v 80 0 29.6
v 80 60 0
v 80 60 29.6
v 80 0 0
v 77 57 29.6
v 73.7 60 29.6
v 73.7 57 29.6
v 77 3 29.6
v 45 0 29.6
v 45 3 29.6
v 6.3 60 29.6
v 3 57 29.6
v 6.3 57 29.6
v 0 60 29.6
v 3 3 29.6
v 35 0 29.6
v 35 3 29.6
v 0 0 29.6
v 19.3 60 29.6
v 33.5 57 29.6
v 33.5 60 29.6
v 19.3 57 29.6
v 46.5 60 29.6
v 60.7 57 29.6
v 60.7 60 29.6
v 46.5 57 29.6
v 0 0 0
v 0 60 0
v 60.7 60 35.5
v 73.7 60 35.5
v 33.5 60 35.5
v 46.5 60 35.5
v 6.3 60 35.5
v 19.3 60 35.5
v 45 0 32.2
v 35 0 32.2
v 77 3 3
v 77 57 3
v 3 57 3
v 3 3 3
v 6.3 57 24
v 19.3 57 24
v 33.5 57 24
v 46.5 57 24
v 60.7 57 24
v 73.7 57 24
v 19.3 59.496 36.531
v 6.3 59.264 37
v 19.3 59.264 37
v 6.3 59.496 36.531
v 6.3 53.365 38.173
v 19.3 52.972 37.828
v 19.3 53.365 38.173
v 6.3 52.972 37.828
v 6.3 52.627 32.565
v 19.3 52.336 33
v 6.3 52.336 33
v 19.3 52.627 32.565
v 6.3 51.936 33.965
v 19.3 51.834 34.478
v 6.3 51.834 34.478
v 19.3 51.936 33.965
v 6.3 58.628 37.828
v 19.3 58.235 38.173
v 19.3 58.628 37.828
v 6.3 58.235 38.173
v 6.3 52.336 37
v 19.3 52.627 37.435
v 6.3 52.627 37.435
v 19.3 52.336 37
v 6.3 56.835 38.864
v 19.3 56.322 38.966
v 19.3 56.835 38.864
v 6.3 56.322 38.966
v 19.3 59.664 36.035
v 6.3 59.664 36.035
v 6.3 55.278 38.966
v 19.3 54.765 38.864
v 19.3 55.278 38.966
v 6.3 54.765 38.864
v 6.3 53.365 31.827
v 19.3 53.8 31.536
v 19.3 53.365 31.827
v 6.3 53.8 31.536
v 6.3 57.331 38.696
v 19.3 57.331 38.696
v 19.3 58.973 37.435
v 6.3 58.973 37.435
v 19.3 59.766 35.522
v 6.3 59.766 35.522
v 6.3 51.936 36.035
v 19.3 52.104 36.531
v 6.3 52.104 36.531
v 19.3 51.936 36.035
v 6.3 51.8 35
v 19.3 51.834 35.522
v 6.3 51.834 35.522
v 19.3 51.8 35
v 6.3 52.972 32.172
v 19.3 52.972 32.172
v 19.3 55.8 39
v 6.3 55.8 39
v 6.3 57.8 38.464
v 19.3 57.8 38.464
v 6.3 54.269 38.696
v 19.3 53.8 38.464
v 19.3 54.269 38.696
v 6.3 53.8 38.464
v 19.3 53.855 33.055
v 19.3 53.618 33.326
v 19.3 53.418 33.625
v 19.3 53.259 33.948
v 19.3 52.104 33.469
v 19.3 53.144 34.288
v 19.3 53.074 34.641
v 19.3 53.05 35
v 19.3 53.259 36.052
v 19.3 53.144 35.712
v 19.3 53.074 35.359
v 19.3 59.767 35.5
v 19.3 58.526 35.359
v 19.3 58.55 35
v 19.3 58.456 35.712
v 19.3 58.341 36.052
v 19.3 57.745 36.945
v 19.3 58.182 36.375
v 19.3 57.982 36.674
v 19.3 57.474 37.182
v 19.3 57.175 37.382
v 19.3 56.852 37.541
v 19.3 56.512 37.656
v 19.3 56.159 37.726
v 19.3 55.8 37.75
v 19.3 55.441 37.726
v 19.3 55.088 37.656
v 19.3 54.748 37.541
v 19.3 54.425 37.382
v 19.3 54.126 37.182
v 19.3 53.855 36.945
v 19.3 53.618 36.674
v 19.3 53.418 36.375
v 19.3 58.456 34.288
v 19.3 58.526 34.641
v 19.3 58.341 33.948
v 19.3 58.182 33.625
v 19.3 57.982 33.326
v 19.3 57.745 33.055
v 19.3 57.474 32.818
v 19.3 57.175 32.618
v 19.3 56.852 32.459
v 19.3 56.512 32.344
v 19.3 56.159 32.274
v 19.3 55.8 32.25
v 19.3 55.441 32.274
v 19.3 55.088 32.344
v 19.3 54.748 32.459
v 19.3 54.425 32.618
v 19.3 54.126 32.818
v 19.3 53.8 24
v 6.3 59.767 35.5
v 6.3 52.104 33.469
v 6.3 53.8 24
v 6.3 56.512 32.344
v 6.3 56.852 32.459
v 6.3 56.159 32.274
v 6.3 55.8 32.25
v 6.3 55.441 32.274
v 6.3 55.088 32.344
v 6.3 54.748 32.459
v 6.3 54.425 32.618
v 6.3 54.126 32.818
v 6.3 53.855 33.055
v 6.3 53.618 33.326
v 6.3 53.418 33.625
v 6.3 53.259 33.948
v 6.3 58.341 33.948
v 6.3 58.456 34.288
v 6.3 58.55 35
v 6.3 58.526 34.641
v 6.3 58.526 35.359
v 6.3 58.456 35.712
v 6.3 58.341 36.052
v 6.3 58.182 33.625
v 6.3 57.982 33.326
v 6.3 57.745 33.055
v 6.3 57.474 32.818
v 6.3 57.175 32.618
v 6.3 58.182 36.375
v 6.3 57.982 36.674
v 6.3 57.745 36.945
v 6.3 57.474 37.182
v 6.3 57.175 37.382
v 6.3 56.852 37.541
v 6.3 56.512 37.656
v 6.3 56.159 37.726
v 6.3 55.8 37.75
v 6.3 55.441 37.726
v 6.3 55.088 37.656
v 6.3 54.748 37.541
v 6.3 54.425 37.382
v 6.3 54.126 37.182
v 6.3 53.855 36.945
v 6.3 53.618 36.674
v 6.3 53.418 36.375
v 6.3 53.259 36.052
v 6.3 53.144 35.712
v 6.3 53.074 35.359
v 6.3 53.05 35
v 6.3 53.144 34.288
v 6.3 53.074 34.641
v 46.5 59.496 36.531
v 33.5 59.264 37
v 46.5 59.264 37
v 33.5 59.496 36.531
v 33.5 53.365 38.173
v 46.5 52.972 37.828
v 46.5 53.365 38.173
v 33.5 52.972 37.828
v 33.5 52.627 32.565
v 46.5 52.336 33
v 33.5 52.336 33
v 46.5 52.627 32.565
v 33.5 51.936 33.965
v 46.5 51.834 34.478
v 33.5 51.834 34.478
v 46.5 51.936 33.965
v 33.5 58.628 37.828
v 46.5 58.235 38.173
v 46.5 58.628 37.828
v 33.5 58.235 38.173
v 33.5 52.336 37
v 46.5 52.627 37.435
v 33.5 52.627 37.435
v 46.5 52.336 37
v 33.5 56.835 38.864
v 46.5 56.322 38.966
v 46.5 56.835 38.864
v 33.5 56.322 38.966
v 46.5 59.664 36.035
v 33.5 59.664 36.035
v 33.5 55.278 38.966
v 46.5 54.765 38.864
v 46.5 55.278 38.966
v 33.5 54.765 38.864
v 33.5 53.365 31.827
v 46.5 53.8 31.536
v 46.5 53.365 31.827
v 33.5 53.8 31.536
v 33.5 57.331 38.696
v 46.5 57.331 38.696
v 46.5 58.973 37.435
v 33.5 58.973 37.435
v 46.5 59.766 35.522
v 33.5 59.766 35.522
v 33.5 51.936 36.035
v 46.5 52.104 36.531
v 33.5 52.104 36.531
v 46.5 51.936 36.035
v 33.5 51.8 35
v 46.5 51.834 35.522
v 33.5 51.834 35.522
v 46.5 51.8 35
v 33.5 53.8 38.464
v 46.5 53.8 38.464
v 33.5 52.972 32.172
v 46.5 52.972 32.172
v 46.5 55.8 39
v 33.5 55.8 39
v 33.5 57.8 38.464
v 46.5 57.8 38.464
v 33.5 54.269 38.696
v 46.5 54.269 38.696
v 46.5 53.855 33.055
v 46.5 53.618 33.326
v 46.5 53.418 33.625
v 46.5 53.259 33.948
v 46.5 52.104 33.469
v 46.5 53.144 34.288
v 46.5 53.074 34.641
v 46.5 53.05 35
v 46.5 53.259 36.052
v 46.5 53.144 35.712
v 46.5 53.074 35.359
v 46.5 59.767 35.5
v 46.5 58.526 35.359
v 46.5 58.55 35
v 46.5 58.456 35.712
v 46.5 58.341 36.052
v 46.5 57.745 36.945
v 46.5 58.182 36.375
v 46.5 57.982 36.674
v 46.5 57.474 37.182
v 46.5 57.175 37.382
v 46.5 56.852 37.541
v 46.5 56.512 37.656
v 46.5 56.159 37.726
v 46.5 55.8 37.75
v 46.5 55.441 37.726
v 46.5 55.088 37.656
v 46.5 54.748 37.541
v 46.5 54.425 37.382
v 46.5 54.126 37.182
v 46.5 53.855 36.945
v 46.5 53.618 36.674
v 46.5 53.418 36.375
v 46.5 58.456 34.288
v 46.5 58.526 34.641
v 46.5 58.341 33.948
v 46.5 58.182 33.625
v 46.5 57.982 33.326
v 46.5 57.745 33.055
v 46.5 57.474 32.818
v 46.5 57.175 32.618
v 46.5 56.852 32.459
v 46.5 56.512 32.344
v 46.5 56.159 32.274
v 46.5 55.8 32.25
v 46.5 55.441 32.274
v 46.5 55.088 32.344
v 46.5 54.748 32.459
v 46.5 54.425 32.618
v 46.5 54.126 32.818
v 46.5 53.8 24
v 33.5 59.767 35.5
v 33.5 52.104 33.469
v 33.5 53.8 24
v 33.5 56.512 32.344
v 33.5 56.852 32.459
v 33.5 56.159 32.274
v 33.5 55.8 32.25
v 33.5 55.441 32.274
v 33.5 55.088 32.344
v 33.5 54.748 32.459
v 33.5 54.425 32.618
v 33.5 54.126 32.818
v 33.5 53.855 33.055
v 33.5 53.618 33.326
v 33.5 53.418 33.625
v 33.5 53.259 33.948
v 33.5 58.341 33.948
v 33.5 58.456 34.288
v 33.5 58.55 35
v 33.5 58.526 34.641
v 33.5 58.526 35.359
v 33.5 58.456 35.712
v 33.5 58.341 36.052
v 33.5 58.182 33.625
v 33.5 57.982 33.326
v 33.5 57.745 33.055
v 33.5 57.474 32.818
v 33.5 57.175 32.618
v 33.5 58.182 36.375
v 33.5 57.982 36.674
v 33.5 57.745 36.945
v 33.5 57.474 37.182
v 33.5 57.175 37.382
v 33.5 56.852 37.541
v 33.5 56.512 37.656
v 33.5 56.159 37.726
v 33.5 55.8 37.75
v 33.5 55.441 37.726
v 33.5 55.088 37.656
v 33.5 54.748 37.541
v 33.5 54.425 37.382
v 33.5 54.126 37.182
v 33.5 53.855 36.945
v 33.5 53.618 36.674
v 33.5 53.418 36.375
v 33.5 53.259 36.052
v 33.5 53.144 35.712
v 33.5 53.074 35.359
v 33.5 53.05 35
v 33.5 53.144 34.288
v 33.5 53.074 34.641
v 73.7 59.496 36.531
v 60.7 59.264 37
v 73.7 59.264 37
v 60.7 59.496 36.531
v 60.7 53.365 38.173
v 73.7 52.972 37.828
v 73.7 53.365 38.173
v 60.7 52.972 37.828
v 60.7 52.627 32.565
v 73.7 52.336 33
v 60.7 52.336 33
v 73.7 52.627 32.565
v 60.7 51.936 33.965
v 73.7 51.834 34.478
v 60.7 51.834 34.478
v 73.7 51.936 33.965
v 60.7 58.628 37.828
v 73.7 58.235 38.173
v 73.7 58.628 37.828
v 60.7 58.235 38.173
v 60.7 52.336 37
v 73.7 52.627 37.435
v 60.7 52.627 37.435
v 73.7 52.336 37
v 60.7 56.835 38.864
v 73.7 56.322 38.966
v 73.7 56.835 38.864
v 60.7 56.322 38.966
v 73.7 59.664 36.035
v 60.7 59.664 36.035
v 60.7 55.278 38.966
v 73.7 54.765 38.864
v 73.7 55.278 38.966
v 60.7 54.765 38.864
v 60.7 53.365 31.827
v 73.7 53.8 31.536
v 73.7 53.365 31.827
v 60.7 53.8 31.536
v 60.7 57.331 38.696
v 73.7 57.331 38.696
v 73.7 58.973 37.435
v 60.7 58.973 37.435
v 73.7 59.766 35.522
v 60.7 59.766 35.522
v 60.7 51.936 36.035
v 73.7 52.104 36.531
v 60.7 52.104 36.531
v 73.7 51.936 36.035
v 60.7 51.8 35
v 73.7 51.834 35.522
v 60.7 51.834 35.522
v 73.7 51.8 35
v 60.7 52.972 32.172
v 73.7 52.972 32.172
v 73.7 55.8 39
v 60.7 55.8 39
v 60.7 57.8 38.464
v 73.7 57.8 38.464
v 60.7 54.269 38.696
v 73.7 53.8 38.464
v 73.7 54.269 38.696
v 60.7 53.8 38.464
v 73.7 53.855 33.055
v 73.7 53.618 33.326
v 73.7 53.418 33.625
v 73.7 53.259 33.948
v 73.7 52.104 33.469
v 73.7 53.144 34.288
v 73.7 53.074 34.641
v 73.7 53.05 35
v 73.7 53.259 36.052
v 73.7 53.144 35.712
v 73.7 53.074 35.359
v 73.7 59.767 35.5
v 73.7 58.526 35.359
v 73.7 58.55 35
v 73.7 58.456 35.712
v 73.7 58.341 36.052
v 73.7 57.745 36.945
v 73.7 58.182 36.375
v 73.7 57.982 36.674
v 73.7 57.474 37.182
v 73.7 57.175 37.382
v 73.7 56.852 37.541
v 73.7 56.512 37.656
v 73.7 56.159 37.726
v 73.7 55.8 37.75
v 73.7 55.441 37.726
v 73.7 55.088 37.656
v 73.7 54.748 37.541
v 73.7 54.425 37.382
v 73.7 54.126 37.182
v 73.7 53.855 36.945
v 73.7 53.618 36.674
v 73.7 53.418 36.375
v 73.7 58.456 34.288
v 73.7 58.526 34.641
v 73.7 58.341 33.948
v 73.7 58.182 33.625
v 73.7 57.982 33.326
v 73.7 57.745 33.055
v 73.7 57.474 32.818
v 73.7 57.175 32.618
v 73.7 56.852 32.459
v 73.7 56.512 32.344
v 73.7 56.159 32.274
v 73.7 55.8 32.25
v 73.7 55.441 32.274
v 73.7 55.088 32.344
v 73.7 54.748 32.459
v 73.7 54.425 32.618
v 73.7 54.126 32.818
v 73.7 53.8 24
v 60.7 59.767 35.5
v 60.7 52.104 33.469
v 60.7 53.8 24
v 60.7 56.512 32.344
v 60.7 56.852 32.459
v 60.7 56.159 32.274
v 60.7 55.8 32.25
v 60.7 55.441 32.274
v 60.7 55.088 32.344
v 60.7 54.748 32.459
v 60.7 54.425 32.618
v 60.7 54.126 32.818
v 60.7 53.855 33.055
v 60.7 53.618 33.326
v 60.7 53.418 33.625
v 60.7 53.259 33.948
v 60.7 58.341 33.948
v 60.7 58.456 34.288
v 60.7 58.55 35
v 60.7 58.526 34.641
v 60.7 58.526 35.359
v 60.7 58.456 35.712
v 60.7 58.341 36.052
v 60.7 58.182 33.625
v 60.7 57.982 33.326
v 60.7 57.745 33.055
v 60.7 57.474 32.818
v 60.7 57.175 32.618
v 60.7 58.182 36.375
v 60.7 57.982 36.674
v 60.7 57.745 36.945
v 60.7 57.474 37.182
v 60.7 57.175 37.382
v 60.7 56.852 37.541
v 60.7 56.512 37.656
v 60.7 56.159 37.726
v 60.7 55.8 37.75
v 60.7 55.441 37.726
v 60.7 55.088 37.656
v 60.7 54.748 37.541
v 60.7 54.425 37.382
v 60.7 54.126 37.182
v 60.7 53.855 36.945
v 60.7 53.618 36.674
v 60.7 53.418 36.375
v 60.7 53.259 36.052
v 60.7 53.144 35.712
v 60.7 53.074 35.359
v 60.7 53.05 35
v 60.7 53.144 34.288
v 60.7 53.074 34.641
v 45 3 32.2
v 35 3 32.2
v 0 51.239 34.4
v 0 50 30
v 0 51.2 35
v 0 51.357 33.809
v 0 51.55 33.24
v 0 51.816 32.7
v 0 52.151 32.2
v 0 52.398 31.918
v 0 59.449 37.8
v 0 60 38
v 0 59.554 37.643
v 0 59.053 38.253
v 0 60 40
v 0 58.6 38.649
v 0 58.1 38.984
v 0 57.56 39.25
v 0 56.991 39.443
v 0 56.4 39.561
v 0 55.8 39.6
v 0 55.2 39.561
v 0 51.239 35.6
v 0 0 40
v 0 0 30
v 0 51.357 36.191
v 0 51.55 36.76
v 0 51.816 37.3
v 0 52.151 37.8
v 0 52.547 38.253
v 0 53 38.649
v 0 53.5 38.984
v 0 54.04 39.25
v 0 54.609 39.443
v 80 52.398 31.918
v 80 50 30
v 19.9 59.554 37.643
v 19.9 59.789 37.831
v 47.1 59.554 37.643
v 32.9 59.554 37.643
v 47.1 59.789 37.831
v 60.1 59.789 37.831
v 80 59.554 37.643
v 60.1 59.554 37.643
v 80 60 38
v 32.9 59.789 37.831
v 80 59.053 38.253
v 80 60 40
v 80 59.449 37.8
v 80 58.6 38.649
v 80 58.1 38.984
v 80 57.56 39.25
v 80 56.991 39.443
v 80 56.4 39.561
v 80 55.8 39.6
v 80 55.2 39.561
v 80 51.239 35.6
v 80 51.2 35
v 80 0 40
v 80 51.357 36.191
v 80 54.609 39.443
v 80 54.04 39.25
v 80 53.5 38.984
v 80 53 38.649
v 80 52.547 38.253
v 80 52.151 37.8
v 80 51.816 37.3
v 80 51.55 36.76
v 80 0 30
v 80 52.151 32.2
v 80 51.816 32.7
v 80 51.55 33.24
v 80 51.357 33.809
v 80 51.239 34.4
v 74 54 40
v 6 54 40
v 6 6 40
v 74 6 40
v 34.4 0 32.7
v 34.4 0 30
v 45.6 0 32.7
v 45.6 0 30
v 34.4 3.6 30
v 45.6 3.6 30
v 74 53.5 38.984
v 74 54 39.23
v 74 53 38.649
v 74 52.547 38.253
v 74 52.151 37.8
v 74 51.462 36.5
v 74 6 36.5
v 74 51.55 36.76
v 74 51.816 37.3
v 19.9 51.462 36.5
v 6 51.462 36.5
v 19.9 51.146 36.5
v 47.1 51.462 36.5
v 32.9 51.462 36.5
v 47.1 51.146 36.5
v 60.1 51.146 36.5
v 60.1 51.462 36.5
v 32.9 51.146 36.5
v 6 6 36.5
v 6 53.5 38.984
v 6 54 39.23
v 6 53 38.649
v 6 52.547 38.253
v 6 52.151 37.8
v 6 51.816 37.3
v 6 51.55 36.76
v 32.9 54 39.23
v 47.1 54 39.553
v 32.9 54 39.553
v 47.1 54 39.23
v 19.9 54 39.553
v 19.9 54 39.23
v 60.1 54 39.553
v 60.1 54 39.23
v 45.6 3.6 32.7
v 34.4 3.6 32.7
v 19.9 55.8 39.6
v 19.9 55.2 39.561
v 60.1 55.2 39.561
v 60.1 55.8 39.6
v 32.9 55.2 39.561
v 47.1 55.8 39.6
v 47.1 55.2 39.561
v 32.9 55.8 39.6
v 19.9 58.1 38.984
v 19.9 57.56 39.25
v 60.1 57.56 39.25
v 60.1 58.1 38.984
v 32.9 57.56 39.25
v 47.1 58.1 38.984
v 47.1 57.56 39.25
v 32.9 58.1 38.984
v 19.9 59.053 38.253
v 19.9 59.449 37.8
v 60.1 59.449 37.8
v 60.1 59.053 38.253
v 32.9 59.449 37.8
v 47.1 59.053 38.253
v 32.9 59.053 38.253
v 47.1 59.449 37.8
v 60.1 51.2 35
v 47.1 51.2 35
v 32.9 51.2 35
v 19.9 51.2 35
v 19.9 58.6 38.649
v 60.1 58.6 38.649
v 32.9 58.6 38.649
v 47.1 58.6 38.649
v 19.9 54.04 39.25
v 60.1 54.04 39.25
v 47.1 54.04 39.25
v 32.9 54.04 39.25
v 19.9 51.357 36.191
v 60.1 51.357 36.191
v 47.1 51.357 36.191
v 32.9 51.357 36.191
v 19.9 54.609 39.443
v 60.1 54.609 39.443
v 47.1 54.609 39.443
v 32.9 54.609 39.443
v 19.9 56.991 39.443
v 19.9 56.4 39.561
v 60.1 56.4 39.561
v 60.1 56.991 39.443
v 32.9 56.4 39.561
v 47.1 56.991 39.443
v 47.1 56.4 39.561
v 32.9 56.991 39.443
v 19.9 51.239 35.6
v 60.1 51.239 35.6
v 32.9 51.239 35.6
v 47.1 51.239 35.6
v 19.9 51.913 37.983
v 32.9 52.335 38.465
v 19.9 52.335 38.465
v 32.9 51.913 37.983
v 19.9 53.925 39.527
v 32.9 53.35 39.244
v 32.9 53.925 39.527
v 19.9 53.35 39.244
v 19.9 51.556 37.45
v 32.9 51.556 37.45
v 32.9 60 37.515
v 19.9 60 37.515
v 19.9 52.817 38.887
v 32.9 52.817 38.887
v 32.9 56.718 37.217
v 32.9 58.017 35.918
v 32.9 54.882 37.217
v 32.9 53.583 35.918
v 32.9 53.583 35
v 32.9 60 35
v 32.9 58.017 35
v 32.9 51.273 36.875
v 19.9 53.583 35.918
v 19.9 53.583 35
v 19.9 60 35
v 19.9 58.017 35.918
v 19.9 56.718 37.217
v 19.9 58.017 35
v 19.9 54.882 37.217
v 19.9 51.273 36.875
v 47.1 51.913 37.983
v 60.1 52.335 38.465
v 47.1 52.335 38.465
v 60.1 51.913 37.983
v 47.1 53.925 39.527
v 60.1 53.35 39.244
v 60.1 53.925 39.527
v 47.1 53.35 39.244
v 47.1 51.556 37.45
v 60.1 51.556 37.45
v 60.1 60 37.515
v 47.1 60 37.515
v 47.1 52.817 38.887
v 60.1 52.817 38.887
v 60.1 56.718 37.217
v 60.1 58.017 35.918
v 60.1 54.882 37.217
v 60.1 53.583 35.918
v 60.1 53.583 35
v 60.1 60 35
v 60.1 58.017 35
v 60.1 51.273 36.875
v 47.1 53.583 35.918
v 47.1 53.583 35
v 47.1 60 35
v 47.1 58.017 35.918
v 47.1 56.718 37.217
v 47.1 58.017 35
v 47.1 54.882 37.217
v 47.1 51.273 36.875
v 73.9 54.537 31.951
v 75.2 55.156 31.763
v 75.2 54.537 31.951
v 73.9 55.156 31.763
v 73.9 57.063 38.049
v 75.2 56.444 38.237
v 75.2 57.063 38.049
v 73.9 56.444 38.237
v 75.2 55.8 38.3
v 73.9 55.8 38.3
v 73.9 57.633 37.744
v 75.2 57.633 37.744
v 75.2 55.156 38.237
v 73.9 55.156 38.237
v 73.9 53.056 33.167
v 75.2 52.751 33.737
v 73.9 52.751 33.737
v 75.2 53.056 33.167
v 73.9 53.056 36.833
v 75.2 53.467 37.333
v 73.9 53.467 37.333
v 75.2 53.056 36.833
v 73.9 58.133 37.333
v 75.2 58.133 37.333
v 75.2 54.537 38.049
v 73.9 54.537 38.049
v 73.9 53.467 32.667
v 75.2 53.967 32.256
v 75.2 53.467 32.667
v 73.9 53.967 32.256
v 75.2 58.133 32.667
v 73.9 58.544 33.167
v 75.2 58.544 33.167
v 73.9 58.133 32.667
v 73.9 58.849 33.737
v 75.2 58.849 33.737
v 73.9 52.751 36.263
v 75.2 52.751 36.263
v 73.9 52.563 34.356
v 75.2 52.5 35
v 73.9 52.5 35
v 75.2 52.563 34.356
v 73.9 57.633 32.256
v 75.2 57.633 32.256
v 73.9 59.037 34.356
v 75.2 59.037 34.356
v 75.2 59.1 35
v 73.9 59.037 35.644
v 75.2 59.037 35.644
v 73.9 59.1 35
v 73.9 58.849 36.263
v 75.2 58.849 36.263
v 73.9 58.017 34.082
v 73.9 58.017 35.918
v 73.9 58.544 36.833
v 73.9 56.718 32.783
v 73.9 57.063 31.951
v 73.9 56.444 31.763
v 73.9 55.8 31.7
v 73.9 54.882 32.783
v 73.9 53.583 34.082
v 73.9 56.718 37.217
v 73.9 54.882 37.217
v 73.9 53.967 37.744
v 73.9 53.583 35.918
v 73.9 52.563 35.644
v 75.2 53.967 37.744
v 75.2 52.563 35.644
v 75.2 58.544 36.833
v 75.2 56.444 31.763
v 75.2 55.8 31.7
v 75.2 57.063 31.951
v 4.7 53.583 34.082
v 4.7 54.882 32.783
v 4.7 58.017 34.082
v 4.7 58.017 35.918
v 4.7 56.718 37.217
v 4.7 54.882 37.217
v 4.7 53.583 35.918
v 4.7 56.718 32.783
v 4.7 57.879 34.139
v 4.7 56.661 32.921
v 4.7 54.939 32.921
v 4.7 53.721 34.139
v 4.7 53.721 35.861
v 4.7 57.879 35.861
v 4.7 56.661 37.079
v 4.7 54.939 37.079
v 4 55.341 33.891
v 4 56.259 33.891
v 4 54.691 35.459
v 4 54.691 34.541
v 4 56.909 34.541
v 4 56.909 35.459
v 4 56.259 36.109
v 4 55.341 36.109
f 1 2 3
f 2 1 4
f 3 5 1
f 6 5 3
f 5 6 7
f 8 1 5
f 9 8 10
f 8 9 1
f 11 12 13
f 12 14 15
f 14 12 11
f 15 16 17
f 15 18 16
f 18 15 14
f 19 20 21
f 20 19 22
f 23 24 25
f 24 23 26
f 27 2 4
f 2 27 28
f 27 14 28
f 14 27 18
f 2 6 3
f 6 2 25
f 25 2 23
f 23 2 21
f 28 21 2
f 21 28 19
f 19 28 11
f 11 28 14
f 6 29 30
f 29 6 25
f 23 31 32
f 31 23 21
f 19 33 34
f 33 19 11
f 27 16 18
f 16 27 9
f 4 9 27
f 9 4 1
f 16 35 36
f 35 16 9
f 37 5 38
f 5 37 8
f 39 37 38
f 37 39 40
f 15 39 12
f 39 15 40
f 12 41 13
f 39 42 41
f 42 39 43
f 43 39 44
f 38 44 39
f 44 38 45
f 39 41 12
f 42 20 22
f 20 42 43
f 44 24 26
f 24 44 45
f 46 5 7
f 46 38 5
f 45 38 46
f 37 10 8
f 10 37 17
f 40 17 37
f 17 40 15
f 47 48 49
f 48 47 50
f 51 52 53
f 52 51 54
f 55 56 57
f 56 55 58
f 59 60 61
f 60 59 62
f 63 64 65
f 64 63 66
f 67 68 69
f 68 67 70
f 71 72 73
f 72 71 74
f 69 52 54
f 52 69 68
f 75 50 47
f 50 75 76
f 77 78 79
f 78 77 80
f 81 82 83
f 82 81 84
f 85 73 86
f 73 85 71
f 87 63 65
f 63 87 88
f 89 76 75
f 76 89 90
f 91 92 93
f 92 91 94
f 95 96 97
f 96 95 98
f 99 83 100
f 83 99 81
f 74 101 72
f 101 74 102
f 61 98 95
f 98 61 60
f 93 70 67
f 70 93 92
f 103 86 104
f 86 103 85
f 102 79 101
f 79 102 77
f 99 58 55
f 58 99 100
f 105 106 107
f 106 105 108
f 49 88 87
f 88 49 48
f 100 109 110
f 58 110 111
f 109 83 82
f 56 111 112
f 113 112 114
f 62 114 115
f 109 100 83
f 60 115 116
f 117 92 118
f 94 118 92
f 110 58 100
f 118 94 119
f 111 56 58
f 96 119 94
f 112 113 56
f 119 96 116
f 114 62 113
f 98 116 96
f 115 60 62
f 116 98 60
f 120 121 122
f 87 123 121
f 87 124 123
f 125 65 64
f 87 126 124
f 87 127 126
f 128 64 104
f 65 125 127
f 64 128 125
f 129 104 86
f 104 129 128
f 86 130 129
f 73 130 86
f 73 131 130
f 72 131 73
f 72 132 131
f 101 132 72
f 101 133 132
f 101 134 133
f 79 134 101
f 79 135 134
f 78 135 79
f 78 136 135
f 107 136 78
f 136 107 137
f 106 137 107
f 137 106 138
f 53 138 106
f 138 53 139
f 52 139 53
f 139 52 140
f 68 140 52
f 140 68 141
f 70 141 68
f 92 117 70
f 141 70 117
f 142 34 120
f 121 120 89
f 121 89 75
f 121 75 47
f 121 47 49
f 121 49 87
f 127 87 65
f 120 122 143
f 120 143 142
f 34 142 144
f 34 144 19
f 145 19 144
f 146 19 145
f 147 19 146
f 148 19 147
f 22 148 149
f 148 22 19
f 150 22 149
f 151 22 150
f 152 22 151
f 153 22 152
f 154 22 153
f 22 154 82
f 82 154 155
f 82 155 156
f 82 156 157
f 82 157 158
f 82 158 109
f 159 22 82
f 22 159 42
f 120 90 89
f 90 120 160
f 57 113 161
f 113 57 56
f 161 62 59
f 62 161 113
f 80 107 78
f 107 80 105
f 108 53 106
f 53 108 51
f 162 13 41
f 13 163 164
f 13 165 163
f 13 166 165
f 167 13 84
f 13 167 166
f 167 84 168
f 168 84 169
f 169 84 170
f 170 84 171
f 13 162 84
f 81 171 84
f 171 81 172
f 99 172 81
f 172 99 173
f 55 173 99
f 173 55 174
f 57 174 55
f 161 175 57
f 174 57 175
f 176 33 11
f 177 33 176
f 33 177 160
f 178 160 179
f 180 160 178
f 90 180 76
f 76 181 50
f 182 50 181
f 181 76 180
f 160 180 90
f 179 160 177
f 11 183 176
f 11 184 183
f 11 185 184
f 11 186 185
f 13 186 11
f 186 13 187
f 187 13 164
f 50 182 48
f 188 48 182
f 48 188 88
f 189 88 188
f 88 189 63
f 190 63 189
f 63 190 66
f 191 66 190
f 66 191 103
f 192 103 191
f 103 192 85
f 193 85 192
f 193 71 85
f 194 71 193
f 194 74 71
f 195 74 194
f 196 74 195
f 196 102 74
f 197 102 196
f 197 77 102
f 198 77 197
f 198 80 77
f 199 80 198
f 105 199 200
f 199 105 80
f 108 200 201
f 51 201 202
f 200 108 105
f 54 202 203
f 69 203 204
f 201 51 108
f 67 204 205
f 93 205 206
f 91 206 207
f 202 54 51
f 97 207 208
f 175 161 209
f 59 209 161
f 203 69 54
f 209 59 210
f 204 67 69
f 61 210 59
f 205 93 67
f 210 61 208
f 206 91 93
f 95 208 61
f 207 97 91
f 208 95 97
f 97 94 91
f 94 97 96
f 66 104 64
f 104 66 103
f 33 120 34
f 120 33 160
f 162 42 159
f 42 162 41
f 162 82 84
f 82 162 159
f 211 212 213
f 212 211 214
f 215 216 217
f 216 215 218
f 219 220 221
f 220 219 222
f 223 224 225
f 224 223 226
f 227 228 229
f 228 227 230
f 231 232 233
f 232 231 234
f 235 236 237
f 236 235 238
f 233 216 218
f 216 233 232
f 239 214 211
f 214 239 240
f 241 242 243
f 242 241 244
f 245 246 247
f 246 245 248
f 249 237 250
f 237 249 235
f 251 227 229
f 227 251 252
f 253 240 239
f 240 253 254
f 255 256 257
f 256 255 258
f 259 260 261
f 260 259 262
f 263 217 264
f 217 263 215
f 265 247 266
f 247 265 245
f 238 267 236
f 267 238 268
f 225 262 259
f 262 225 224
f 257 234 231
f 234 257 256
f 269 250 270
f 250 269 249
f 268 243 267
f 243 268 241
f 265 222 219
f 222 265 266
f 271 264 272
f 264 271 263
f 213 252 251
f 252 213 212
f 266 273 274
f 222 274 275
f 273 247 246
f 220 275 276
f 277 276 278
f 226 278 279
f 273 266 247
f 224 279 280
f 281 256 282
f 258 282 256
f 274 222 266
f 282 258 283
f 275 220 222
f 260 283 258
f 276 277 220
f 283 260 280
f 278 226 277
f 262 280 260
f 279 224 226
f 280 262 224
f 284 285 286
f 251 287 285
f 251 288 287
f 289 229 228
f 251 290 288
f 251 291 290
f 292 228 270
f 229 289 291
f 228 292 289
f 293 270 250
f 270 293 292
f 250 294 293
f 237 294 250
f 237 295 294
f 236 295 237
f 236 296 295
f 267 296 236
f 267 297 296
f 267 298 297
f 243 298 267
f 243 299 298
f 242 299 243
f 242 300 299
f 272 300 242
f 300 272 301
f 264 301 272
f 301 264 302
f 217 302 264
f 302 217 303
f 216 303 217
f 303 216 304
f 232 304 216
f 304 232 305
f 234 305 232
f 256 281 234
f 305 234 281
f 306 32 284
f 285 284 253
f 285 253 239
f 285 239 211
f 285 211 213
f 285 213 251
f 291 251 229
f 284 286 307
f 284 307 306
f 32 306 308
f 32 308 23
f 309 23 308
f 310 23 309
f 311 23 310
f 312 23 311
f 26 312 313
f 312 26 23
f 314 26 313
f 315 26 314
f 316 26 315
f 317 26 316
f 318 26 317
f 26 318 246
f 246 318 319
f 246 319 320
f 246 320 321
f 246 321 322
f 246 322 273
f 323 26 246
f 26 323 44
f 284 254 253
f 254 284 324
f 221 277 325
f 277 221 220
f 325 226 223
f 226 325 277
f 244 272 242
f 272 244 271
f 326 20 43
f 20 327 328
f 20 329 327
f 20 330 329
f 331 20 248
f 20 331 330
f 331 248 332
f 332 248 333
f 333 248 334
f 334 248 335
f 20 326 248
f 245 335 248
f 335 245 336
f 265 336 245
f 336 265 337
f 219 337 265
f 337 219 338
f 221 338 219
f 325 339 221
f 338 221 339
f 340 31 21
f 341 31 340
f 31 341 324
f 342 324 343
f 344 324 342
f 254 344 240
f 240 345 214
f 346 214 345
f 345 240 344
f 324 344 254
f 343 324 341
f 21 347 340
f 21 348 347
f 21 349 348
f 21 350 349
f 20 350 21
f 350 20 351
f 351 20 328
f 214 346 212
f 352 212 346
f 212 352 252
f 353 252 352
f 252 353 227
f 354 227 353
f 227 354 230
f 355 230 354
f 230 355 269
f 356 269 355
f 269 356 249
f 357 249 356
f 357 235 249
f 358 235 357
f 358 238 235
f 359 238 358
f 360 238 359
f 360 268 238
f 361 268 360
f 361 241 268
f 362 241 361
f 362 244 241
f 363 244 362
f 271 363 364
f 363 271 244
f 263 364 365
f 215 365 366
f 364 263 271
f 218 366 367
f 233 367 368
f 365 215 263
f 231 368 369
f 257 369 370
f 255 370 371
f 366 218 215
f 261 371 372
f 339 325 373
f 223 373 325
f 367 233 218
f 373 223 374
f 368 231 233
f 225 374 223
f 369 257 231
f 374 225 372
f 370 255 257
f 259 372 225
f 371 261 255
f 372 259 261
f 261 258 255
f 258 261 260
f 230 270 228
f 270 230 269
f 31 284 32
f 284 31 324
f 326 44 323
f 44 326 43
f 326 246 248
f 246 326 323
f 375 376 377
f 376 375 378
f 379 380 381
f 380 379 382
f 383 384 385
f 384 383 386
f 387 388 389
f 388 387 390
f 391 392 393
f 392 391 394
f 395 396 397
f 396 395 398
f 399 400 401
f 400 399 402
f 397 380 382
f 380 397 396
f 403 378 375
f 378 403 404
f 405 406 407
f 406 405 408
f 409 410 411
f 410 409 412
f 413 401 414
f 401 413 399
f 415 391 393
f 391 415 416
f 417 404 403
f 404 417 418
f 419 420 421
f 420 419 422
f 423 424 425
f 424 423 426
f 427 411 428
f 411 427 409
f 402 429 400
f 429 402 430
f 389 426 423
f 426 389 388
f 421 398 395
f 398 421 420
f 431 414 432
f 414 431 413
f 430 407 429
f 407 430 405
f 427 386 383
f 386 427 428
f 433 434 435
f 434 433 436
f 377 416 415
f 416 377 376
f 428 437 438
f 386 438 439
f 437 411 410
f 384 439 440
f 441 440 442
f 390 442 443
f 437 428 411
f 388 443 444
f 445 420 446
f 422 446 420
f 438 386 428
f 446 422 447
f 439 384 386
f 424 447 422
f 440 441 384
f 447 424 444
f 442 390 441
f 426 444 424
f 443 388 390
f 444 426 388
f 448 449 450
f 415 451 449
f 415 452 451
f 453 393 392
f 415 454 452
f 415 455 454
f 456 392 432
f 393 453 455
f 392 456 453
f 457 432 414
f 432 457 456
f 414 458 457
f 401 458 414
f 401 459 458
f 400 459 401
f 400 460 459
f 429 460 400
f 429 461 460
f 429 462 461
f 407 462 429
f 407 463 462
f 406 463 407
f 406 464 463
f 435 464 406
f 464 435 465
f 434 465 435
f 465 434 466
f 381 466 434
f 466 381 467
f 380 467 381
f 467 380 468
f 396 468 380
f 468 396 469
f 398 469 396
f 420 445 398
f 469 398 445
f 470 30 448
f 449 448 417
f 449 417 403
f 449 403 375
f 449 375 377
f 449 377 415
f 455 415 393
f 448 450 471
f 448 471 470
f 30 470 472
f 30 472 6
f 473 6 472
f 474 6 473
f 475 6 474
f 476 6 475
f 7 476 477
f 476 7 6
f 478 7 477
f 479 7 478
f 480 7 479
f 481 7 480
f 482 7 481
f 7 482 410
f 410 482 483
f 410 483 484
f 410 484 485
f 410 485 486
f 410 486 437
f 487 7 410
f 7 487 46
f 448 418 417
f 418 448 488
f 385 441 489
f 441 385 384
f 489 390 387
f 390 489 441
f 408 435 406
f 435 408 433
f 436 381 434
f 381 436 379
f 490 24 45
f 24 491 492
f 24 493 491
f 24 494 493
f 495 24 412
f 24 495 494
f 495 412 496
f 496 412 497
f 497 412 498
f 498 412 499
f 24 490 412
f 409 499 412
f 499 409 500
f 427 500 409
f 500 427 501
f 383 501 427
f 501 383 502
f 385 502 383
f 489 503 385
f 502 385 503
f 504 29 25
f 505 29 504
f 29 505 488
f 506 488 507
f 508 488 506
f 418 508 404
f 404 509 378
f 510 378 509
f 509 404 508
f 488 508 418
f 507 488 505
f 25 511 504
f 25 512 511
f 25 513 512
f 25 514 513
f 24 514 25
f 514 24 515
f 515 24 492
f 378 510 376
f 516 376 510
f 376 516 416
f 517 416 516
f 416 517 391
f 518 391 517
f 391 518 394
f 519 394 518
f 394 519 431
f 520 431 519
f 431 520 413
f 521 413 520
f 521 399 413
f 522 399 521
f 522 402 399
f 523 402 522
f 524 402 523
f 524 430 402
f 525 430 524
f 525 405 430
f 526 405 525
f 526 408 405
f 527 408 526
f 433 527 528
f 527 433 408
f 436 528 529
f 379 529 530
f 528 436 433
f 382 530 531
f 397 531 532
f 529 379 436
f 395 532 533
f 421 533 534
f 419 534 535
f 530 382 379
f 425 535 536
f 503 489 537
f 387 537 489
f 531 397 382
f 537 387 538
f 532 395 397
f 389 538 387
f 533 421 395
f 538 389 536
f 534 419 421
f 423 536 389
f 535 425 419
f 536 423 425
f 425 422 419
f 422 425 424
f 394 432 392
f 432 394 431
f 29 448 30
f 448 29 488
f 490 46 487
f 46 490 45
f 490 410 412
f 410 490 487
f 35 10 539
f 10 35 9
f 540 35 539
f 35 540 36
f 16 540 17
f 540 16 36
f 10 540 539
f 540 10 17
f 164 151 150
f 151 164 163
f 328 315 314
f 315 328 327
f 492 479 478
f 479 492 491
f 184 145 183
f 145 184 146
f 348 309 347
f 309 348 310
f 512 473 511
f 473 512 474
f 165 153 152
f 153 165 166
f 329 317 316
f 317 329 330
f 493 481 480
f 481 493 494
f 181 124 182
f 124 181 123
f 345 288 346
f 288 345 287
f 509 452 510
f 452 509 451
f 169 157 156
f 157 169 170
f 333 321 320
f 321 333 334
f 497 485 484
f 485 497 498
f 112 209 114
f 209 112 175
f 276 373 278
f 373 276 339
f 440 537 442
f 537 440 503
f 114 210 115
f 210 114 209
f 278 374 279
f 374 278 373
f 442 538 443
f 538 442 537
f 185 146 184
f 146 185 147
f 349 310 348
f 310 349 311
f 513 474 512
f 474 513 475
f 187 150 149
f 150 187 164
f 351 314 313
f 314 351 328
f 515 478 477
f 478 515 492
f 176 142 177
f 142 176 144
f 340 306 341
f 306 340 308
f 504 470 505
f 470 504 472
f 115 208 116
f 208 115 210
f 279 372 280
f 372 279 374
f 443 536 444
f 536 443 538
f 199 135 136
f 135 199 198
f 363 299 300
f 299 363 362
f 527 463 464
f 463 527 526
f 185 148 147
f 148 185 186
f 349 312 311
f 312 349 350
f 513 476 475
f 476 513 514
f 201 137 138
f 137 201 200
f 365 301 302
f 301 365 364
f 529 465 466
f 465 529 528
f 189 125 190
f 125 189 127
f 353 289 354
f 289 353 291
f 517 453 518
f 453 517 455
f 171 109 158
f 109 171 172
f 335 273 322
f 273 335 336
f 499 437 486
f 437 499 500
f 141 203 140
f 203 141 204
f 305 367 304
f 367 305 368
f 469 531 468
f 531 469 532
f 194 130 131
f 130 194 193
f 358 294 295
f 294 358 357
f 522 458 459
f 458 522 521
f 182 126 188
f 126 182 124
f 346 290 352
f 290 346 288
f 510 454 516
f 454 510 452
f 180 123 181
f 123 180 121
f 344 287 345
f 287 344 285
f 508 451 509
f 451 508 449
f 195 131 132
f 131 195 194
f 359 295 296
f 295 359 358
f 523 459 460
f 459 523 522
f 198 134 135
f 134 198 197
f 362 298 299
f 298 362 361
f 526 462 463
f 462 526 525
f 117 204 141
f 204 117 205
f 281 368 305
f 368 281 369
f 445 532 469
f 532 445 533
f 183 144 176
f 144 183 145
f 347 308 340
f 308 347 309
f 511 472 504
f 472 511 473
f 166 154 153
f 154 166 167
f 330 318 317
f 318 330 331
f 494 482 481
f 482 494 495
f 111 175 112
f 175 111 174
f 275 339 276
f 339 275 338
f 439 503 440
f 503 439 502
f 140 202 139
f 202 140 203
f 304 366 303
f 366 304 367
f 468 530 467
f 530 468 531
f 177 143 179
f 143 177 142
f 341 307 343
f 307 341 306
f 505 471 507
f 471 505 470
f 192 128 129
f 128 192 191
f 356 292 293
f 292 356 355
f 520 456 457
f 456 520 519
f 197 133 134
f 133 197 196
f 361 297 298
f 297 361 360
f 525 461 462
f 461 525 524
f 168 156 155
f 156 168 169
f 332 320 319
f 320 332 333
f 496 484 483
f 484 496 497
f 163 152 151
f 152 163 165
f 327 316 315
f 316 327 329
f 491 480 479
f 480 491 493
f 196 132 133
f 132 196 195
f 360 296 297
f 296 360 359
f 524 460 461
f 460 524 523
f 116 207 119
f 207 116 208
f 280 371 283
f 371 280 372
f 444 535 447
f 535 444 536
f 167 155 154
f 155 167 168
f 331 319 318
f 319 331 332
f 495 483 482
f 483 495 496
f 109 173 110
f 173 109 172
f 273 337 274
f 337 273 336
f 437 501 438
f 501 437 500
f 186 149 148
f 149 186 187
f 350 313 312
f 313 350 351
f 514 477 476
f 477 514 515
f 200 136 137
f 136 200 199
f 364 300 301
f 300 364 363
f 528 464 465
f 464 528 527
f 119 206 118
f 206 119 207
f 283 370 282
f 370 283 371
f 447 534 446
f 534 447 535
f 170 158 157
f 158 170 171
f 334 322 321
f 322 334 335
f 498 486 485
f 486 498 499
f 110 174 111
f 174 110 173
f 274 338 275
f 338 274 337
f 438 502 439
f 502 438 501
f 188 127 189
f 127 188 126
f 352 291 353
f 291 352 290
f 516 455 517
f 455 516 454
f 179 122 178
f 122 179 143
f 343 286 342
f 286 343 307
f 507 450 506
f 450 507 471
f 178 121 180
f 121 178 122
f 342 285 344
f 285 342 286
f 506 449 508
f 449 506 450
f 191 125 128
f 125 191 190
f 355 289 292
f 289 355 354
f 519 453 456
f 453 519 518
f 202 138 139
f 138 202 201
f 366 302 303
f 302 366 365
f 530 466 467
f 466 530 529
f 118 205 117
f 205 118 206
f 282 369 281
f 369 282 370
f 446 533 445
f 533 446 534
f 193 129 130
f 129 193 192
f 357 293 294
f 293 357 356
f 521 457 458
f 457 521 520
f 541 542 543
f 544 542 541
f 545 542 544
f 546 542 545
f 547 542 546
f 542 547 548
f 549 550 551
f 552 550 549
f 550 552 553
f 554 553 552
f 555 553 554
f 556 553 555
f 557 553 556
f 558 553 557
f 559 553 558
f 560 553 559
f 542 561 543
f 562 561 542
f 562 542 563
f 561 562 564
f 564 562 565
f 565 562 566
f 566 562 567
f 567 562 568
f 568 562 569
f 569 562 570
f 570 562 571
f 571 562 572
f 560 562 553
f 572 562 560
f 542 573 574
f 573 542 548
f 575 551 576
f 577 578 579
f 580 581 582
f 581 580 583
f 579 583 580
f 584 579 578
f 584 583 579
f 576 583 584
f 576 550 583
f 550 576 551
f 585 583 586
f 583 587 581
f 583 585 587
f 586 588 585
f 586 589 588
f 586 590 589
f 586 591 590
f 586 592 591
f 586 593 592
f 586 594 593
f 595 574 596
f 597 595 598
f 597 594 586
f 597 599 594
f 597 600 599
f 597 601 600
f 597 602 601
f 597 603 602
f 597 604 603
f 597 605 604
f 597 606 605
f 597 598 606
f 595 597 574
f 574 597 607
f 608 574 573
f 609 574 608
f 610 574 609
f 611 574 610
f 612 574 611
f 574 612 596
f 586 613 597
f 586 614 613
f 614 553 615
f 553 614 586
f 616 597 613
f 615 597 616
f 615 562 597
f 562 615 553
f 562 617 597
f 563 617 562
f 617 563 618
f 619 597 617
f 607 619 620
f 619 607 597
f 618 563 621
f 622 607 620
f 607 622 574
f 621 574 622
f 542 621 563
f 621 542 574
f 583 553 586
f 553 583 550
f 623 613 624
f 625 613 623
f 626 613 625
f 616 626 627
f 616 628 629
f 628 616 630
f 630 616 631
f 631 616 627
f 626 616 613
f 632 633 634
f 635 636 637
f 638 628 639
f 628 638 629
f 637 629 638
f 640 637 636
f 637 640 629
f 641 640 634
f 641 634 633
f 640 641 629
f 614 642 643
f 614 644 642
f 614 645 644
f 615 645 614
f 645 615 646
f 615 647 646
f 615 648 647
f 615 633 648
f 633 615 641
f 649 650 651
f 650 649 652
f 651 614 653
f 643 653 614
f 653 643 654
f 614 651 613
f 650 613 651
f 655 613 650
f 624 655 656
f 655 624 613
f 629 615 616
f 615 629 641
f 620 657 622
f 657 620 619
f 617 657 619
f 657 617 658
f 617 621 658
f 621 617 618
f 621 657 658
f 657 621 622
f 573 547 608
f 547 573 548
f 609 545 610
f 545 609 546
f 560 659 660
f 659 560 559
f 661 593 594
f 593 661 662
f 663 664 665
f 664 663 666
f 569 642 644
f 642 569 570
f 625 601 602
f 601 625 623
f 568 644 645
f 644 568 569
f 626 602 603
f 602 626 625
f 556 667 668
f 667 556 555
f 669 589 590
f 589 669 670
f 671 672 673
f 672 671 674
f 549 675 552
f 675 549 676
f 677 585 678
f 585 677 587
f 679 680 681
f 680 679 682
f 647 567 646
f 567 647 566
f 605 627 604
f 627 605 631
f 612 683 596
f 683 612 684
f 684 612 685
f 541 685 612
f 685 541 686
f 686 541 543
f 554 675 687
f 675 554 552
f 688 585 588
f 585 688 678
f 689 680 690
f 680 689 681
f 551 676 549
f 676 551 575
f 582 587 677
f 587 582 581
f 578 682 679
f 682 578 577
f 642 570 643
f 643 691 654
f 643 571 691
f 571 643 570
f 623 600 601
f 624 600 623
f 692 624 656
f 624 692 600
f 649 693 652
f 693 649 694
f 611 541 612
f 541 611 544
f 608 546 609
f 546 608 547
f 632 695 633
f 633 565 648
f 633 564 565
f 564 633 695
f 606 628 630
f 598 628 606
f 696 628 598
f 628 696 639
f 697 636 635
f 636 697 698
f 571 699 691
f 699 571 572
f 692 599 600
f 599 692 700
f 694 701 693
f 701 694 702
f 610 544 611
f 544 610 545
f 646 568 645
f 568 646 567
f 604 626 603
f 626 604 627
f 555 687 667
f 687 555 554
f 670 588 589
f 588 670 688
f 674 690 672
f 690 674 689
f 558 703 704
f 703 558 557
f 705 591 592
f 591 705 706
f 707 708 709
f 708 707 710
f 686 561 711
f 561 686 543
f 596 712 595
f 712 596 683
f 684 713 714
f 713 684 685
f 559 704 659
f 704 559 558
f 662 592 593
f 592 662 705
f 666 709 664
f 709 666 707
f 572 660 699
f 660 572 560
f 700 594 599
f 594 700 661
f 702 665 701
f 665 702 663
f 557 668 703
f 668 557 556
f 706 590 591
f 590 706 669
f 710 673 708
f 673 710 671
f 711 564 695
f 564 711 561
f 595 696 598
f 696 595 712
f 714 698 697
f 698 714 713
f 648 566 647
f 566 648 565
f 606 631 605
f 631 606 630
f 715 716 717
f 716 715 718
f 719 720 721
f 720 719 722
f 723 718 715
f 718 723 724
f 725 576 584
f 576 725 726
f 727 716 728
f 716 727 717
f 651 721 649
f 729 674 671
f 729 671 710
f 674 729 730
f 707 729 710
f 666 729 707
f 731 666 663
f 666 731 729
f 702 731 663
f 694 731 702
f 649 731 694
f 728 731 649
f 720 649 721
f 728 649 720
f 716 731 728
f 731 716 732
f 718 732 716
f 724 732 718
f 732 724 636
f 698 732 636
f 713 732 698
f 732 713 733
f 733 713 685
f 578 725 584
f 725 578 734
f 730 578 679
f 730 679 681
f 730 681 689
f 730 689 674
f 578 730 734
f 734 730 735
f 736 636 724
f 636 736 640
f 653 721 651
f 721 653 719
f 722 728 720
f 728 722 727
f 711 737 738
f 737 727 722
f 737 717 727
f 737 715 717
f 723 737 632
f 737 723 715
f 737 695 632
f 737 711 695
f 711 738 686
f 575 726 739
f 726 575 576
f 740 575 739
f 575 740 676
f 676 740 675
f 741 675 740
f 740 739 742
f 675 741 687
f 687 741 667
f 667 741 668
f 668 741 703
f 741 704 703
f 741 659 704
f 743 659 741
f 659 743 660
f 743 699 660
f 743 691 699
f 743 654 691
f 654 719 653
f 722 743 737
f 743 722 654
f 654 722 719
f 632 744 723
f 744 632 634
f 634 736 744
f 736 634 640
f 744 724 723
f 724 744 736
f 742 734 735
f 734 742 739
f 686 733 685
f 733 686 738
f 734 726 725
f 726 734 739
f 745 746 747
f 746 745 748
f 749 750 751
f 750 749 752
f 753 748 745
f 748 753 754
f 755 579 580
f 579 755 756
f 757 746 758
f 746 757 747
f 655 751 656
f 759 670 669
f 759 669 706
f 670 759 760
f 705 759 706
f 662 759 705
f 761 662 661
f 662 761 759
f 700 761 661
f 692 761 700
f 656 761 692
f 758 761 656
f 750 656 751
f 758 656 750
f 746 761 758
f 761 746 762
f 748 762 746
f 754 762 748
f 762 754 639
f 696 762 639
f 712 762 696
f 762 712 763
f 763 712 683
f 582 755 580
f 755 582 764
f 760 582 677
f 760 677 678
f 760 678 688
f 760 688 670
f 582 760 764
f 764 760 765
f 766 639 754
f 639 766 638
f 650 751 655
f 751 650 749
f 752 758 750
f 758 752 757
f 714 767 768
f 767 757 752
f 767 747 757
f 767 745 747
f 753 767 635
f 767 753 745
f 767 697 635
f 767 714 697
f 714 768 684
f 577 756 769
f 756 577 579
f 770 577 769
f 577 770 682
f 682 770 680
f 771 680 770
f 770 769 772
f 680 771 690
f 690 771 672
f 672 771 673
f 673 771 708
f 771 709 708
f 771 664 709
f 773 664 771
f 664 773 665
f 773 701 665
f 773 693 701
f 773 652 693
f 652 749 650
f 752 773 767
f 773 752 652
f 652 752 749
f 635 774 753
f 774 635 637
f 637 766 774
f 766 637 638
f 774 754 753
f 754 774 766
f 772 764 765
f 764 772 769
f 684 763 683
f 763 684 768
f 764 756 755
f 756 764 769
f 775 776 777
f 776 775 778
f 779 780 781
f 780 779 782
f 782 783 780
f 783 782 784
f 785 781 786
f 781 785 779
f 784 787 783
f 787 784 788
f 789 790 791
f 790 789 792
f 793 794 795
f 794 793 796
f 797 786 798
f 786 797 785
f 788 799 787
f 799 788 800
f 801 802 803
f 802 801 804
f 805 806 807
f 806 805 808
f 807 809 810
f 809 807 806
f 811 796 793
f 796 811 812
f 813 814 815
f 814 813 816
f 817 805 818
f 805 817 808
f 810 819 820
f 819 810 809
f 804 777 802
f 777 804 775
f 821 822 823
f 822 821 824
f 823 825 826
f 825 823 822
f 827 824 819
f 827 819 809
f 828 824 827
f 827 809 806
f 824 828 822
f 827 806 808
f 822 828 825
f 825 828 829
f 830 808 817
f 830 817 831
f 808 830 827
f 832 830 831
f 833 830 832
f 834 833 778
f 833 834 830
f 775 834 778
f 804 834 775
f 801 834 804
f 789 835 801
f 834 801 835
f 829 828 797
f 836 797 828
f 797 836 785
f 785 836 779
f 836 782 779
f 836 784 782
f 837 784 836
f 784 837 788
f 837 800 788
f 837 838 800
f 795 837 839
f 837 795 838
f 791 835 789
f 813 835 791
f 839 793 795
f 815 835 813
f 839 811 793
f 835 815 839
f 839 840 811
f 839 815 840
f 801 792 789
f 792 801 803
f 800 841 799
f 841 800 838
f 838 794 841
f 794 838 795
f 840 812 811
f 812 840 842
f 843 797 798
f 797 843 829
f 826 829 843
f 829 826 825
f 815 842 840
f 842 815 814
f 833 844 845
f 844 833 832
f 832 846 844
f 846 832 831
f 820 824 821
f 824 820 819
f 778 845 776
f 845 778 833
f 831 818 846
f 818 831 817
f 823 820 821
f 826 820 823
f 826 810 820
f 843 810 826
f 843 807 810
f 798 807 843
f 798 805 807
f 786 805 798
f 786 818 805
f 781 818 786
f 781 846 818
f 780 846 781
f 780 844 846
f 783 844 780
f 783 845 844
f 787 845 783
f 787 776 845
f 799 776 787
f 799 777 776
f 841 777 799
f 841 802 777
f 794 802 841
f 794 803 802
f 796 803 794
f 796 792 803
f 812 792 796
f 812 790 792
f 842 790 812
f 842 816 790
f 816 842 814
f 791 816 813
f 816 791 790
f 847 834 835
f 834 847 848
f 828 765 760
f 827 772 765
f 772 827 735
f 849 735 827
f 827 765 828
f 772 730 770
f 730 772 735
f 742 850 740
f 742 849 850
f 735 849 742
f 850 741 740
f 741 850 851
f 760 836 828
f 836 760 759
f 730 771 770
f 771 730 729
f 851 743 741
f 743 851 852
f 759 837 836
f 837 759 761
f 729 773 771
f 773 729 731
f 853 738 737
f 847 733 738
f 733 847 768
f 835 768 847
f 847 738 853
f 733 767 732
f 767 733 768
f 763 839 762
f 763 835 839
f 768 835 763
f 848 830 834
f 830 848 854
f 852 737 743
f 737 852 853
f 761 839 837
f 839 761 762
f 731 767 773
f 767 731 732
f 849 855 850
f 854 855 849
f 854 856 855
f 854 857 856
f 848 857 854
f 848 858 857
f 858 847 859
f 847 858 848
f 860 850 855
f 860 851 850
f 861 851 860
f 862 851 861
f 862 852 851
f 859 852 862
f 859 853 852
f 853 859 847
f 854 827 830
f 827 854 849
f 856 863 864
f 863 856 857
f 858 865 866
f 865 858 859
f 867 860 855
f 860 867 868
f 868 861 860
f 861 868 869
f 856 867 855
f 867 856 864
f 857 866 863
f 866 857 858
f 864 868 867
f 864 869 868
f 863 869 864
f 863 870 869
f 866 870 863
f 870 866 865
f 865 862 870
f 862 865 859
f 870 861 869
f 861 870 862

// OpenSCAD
// Print-in-place hinged box, 80 x 60 x 40 mm closed.
// Printed closed in PLA (Bambu A1, 0.4 nozzle): base, lid and a captive
// hinge pin are separate bodies with 0.35-0.6 mm clearances, so the hinge
// breaks free by hand.  No supports: the lid underside bridges the cavity,
// the hinge barrels/pin use faceted (octagonal) lower surfaces, and all
// other downward faces are short bridges or rest on the body below.

/* [Part] */
part = "assembly"; // [assembly, box, lid, pin]

/* [Dimensions] */
box_w = 80;          // X, outside
box_d = 60;          // Y, outside (front y=0, back y=60)
box_h = 29.6;        // base height to its rim
lid_h = 10;          // lid height; lid bottom at z=30 (0.4 gap)
lid_z = 30;
wall = 3;
floor_t = 3;
total_h = 40;

hinge_y = 55.8;      // hinge axis, assembly coords
hinge_z = 35;
barrel_r = 4.0;
pin_r = 2.4;         // octagon circumradius
bore_r = 2.75;       // pin_r + 0.35 radial clearance
relief_r = 4.6;      // barrel_r + 0.6

// Alternating knuckles along the back edge (x intervals), 0.6 mm end gaps.
box_segs  = [[6.3, 19.3], [33.5, 46.5], [60.7, 73.7]];
lid_segs  = [[19.9, 32.9], [47.1, 60.1]];

cadverify_only = "";
module instance(name, part_name, unit = 1) {
    echo(cadverify_instance = [name, part_name, unit]);
    if (cadverify_only == "" || cadverify_only == name) children();
}

// ---------------------------------------------------------------- base (box)
module box_main() {
    difference() {
        union() {
            // shell: outer block minus open-top cavity
            difference() {
                cube([box_w, box_d, box_h]);
                translate([wall, wall, floor_t]) cube([box_w - 2 * wall, box_d - 2 * wall, box_h]);
            }
            // hinge knuckles (base) + support posts down to the back wall
            for (s = box_segs) {
                translate([s[0], hinge_y, hinge_z]) rotate([0, 90, 0])
                    cylinder(h = s[1] - s[0], r = barrel_r, $fn = 48);
                translate([s[0], 53.8, 24]) cube([s[1] - s[0], 6.2, 11.5]);
            }
            // front catch tooth (enters the socket in the lid)
            translate([35, 0, box_h]) cube([10, wall, 2.6]);
        }
        // pin bore through the base knuckles
        translate([-1, hinge_y, hinge_z]) rotate([0, 90, 0])
            cylinder(h = box_w + 2, r = bore_r, $fn = 48);
    }
}

// ---------------------------------------------------------------- lid (local: z 0..10, hinge axis at z=5)
module lid_main() {
    union() {
        difference() {
            union() {
                // main slab, side profile (Y-Z) extruded along X.
                // Rear lower edge chamfered 50,0 -> 60,8 so the slab
                // swings clear of the base back wall.
                multmatrix([[0, 0, 1, 0], [1, 0, 0, 0], [0, 1, 0, 0], [0, 0, 0, 1]])
                    linear_extrude(height = box_w)
                        polygon(points = [[0, 0], [50, 0], [60, 8], [60, 10], [0, 10]]);
                // hinge knuckles (lid)
                for (s = lid_segs)
                    translate([s[0], hinge_y, 5]) rotate([0, 90, 0])
                        cylinder(h = s[1] - s[0], r = barrel_r, $fn = 48);
            }
            // recessed panel in the top face
            translate([6, 6, 6.5]) cube([68, 48, 4]);
            // front catch socket (tooth: x35..45, z assy 29.6..32.2)
            translate([34.4, -1, -0.5]) cube([11.2, 4.6, 3.2]);
            // clearance tunnel for the base knuckles / pin
            translate([-1, hinge_y, 5]) rotate([0, 90, 0])
                cylinder(h = box_w + 2, r = relief_r, $fn = 48);
            // pin bore through the lid knuckles
            translate([-1, hinge_y, 5]) rotate([0, 90, 0])
                cylinder(h = box_w + 2, r = bore_r, $fn = 48);
        }
        // webs joining lid knuckles to the slab: upper half-discs r=4.9
        // (stay above z=30.1 in assembly, clear of the base rim at 29.6)
        for (s = lid_segs)
            intersection() {
                translate([s[0], hinge_y, 5]) rotate([0, 90, 0])
                    cylinder(h = s[1] - s[0], r = 4.9, $fn = 48);
                translate([s[0], hinge_y - 10, 5]) cube([s[1] - s[0], 20, 5]);
                translate([s[0], 0, 0]) cube([s[1] - s[0], box_d, lid_h]);
            }
    }
}

// ---------------------------------------------------------------- pin
// Centred on its axis, local +Z from head (z=0) to tip (z=71.2).
module pin_geom() {
    union() {
        cylinder(h = 1.3, r = 3.3, $fn = 32);                    // head
        translate([0, 0, 1.0]) rotate([0, 0, 22.5])
            cylinder(h = 69.5, r = pin_r, $fn = 8);              // octagonal shaft
        translate([0, 0, 70.4]) rotate([0, 0, 22.5])
            cylinder(h = 0.8, r1 = pin_r, r2 = 1.2, $fn = 8);    // lead-in tip
    }
}
module pin_part() { translate([3.3, 3.3, 0]) pin_geom(); }

// ---------------------------------------------------------------- output
if (part == "box") {
    echo(cadverify_spec = [
        ["bounds", [[0, 0, 0], [box_w, box_d, hinge_z + barrel_r]]],
        ["bodies", 1],
        ["copies", 1],
        ["support_faces", [["bed", "-z", 4000]]],
        ["overhangs_allowed", [["hinge knuckles and pin bore print in place; faceted bore ceiling is a short internal bridge", [[5, 51, 30], [75, 60, 39.5]]]]],
        ["details", [
            ["cavity", "void", [[4, 4, 10], [76, 53, 29]], 0.95],
            ["front_wall", "thickness", [40, -1, 15], [0, 1, 0], 3],
            ["floor", "thickness", [40, 30, -1], [0, 0, 1], 3],
            ["box_knuckle", "material", [[7, 52, 33.5], [18, 53.8, 36.5]], 0.85],
            ["pin_bore", "void", [[8, 54.9, 34.1], [17, 56.7, 35.9]], 0.9],
            ["catch_tooth", "material", [[36, 0.5, 30], [44, 2.5, 32]], 0.85],
            ["hinge_knuckles", "view", [[4, 50, 28], [76, 60, 39.5]]]
        ]]
    ]);
    box_main();
} else if (part == "lid") {
    echo(cadverify_spec = [
        ["bounds", [[0, 0, 0], [box_w, box_d, lid_h]]],
        ["bodies", 1],
        ["copies", 1],
        ["support_faces", [["print_face", "-z", 3000]]],
        ["overhangs_allowed", [["lid knuckle bores print in place around the pin; bore ceilings are short internal bridges", [[5, 51, 0], [75, 60, 10]]]]],
        ["details", [
            ["top_pocket", "void", [[7, 7, 6.6], [73, 53, 9.9]], 0.95],
            ["lid_slab", "thickness", [40, 30, 9], [0, 0, -1], 6.5],
            ["lid_knuckle", "material", [[21, 52, 3.5], [32, 53.8, 6.5]], 0.85],
            ["pin_bore", "void", [[22, 55, 4.2], [31, 56.6, 5.8]], 0.9],
            ["catch_socket", "void", [[35, 0.5, 0.2], [45, 2.5, 2.5]], 0.9],
            ["hinge_knuckles", "view", [[4, 50, 0], [76, 60, 10]]]
        ]]
    ]);
    lid_main();
} else if (part == "pin") {
    echo(cadverify_spec = [
        ["bounds", [[0, 0, 0], [6.6, 6.6, 71.2]]],
        ["bodies", 1],
        ["copies", 1],
        ["support_faces", [["head_base", "-z", 30]]],
        ["overhangs_allowed", []],
        ["details", [
            ["pin_shaft", "material", [[2, 2, 10], [4.6, 4.6, 20]], 0.9],
            ["pin_head", "material", [[1, 1, 0.1], [5.6, 5.6, 1.2]], 0.75],
            ["pin_length", "thickness", [1.2, 3.3, 72], [0, 0, -1], 71.2],
            ["pin_head_view", "view", [[0, 0, 0], [6.6, 6.6, 2]]]
        ]]
    ]);
    pin_part();
} else if (part == "assembly") {
    echo(cadverify_spec = [
        ["bounds", [[0, 0, 0], [box_w, box_d, total_h]]],
        ["support_faces", [["bed", "-z", 4000]]],
        ["allowed_interferences", []],
        ["motions", [
            ["lid_swing", ["lid"], "rotate", [0, hinge_y, hinge_z], [-1, 0, 0], [0, 110]]
        ]],
        ["assembly_order", [
            [["base"], [0, 0, 0]],
            [["lid"], [0, 0, -1]],
            [["pin"], [-1, 0, 0]]
        ]]
    ]);
    instance("base", "box") box_main();
    instance("lid", "lid") translate([0, 0, lid_z]) lid_main();
    instance("pin", "pin") translate([75.2, hinge_y, hinge_z]) rotate([0, -90, 0]) pin_geom();
}
